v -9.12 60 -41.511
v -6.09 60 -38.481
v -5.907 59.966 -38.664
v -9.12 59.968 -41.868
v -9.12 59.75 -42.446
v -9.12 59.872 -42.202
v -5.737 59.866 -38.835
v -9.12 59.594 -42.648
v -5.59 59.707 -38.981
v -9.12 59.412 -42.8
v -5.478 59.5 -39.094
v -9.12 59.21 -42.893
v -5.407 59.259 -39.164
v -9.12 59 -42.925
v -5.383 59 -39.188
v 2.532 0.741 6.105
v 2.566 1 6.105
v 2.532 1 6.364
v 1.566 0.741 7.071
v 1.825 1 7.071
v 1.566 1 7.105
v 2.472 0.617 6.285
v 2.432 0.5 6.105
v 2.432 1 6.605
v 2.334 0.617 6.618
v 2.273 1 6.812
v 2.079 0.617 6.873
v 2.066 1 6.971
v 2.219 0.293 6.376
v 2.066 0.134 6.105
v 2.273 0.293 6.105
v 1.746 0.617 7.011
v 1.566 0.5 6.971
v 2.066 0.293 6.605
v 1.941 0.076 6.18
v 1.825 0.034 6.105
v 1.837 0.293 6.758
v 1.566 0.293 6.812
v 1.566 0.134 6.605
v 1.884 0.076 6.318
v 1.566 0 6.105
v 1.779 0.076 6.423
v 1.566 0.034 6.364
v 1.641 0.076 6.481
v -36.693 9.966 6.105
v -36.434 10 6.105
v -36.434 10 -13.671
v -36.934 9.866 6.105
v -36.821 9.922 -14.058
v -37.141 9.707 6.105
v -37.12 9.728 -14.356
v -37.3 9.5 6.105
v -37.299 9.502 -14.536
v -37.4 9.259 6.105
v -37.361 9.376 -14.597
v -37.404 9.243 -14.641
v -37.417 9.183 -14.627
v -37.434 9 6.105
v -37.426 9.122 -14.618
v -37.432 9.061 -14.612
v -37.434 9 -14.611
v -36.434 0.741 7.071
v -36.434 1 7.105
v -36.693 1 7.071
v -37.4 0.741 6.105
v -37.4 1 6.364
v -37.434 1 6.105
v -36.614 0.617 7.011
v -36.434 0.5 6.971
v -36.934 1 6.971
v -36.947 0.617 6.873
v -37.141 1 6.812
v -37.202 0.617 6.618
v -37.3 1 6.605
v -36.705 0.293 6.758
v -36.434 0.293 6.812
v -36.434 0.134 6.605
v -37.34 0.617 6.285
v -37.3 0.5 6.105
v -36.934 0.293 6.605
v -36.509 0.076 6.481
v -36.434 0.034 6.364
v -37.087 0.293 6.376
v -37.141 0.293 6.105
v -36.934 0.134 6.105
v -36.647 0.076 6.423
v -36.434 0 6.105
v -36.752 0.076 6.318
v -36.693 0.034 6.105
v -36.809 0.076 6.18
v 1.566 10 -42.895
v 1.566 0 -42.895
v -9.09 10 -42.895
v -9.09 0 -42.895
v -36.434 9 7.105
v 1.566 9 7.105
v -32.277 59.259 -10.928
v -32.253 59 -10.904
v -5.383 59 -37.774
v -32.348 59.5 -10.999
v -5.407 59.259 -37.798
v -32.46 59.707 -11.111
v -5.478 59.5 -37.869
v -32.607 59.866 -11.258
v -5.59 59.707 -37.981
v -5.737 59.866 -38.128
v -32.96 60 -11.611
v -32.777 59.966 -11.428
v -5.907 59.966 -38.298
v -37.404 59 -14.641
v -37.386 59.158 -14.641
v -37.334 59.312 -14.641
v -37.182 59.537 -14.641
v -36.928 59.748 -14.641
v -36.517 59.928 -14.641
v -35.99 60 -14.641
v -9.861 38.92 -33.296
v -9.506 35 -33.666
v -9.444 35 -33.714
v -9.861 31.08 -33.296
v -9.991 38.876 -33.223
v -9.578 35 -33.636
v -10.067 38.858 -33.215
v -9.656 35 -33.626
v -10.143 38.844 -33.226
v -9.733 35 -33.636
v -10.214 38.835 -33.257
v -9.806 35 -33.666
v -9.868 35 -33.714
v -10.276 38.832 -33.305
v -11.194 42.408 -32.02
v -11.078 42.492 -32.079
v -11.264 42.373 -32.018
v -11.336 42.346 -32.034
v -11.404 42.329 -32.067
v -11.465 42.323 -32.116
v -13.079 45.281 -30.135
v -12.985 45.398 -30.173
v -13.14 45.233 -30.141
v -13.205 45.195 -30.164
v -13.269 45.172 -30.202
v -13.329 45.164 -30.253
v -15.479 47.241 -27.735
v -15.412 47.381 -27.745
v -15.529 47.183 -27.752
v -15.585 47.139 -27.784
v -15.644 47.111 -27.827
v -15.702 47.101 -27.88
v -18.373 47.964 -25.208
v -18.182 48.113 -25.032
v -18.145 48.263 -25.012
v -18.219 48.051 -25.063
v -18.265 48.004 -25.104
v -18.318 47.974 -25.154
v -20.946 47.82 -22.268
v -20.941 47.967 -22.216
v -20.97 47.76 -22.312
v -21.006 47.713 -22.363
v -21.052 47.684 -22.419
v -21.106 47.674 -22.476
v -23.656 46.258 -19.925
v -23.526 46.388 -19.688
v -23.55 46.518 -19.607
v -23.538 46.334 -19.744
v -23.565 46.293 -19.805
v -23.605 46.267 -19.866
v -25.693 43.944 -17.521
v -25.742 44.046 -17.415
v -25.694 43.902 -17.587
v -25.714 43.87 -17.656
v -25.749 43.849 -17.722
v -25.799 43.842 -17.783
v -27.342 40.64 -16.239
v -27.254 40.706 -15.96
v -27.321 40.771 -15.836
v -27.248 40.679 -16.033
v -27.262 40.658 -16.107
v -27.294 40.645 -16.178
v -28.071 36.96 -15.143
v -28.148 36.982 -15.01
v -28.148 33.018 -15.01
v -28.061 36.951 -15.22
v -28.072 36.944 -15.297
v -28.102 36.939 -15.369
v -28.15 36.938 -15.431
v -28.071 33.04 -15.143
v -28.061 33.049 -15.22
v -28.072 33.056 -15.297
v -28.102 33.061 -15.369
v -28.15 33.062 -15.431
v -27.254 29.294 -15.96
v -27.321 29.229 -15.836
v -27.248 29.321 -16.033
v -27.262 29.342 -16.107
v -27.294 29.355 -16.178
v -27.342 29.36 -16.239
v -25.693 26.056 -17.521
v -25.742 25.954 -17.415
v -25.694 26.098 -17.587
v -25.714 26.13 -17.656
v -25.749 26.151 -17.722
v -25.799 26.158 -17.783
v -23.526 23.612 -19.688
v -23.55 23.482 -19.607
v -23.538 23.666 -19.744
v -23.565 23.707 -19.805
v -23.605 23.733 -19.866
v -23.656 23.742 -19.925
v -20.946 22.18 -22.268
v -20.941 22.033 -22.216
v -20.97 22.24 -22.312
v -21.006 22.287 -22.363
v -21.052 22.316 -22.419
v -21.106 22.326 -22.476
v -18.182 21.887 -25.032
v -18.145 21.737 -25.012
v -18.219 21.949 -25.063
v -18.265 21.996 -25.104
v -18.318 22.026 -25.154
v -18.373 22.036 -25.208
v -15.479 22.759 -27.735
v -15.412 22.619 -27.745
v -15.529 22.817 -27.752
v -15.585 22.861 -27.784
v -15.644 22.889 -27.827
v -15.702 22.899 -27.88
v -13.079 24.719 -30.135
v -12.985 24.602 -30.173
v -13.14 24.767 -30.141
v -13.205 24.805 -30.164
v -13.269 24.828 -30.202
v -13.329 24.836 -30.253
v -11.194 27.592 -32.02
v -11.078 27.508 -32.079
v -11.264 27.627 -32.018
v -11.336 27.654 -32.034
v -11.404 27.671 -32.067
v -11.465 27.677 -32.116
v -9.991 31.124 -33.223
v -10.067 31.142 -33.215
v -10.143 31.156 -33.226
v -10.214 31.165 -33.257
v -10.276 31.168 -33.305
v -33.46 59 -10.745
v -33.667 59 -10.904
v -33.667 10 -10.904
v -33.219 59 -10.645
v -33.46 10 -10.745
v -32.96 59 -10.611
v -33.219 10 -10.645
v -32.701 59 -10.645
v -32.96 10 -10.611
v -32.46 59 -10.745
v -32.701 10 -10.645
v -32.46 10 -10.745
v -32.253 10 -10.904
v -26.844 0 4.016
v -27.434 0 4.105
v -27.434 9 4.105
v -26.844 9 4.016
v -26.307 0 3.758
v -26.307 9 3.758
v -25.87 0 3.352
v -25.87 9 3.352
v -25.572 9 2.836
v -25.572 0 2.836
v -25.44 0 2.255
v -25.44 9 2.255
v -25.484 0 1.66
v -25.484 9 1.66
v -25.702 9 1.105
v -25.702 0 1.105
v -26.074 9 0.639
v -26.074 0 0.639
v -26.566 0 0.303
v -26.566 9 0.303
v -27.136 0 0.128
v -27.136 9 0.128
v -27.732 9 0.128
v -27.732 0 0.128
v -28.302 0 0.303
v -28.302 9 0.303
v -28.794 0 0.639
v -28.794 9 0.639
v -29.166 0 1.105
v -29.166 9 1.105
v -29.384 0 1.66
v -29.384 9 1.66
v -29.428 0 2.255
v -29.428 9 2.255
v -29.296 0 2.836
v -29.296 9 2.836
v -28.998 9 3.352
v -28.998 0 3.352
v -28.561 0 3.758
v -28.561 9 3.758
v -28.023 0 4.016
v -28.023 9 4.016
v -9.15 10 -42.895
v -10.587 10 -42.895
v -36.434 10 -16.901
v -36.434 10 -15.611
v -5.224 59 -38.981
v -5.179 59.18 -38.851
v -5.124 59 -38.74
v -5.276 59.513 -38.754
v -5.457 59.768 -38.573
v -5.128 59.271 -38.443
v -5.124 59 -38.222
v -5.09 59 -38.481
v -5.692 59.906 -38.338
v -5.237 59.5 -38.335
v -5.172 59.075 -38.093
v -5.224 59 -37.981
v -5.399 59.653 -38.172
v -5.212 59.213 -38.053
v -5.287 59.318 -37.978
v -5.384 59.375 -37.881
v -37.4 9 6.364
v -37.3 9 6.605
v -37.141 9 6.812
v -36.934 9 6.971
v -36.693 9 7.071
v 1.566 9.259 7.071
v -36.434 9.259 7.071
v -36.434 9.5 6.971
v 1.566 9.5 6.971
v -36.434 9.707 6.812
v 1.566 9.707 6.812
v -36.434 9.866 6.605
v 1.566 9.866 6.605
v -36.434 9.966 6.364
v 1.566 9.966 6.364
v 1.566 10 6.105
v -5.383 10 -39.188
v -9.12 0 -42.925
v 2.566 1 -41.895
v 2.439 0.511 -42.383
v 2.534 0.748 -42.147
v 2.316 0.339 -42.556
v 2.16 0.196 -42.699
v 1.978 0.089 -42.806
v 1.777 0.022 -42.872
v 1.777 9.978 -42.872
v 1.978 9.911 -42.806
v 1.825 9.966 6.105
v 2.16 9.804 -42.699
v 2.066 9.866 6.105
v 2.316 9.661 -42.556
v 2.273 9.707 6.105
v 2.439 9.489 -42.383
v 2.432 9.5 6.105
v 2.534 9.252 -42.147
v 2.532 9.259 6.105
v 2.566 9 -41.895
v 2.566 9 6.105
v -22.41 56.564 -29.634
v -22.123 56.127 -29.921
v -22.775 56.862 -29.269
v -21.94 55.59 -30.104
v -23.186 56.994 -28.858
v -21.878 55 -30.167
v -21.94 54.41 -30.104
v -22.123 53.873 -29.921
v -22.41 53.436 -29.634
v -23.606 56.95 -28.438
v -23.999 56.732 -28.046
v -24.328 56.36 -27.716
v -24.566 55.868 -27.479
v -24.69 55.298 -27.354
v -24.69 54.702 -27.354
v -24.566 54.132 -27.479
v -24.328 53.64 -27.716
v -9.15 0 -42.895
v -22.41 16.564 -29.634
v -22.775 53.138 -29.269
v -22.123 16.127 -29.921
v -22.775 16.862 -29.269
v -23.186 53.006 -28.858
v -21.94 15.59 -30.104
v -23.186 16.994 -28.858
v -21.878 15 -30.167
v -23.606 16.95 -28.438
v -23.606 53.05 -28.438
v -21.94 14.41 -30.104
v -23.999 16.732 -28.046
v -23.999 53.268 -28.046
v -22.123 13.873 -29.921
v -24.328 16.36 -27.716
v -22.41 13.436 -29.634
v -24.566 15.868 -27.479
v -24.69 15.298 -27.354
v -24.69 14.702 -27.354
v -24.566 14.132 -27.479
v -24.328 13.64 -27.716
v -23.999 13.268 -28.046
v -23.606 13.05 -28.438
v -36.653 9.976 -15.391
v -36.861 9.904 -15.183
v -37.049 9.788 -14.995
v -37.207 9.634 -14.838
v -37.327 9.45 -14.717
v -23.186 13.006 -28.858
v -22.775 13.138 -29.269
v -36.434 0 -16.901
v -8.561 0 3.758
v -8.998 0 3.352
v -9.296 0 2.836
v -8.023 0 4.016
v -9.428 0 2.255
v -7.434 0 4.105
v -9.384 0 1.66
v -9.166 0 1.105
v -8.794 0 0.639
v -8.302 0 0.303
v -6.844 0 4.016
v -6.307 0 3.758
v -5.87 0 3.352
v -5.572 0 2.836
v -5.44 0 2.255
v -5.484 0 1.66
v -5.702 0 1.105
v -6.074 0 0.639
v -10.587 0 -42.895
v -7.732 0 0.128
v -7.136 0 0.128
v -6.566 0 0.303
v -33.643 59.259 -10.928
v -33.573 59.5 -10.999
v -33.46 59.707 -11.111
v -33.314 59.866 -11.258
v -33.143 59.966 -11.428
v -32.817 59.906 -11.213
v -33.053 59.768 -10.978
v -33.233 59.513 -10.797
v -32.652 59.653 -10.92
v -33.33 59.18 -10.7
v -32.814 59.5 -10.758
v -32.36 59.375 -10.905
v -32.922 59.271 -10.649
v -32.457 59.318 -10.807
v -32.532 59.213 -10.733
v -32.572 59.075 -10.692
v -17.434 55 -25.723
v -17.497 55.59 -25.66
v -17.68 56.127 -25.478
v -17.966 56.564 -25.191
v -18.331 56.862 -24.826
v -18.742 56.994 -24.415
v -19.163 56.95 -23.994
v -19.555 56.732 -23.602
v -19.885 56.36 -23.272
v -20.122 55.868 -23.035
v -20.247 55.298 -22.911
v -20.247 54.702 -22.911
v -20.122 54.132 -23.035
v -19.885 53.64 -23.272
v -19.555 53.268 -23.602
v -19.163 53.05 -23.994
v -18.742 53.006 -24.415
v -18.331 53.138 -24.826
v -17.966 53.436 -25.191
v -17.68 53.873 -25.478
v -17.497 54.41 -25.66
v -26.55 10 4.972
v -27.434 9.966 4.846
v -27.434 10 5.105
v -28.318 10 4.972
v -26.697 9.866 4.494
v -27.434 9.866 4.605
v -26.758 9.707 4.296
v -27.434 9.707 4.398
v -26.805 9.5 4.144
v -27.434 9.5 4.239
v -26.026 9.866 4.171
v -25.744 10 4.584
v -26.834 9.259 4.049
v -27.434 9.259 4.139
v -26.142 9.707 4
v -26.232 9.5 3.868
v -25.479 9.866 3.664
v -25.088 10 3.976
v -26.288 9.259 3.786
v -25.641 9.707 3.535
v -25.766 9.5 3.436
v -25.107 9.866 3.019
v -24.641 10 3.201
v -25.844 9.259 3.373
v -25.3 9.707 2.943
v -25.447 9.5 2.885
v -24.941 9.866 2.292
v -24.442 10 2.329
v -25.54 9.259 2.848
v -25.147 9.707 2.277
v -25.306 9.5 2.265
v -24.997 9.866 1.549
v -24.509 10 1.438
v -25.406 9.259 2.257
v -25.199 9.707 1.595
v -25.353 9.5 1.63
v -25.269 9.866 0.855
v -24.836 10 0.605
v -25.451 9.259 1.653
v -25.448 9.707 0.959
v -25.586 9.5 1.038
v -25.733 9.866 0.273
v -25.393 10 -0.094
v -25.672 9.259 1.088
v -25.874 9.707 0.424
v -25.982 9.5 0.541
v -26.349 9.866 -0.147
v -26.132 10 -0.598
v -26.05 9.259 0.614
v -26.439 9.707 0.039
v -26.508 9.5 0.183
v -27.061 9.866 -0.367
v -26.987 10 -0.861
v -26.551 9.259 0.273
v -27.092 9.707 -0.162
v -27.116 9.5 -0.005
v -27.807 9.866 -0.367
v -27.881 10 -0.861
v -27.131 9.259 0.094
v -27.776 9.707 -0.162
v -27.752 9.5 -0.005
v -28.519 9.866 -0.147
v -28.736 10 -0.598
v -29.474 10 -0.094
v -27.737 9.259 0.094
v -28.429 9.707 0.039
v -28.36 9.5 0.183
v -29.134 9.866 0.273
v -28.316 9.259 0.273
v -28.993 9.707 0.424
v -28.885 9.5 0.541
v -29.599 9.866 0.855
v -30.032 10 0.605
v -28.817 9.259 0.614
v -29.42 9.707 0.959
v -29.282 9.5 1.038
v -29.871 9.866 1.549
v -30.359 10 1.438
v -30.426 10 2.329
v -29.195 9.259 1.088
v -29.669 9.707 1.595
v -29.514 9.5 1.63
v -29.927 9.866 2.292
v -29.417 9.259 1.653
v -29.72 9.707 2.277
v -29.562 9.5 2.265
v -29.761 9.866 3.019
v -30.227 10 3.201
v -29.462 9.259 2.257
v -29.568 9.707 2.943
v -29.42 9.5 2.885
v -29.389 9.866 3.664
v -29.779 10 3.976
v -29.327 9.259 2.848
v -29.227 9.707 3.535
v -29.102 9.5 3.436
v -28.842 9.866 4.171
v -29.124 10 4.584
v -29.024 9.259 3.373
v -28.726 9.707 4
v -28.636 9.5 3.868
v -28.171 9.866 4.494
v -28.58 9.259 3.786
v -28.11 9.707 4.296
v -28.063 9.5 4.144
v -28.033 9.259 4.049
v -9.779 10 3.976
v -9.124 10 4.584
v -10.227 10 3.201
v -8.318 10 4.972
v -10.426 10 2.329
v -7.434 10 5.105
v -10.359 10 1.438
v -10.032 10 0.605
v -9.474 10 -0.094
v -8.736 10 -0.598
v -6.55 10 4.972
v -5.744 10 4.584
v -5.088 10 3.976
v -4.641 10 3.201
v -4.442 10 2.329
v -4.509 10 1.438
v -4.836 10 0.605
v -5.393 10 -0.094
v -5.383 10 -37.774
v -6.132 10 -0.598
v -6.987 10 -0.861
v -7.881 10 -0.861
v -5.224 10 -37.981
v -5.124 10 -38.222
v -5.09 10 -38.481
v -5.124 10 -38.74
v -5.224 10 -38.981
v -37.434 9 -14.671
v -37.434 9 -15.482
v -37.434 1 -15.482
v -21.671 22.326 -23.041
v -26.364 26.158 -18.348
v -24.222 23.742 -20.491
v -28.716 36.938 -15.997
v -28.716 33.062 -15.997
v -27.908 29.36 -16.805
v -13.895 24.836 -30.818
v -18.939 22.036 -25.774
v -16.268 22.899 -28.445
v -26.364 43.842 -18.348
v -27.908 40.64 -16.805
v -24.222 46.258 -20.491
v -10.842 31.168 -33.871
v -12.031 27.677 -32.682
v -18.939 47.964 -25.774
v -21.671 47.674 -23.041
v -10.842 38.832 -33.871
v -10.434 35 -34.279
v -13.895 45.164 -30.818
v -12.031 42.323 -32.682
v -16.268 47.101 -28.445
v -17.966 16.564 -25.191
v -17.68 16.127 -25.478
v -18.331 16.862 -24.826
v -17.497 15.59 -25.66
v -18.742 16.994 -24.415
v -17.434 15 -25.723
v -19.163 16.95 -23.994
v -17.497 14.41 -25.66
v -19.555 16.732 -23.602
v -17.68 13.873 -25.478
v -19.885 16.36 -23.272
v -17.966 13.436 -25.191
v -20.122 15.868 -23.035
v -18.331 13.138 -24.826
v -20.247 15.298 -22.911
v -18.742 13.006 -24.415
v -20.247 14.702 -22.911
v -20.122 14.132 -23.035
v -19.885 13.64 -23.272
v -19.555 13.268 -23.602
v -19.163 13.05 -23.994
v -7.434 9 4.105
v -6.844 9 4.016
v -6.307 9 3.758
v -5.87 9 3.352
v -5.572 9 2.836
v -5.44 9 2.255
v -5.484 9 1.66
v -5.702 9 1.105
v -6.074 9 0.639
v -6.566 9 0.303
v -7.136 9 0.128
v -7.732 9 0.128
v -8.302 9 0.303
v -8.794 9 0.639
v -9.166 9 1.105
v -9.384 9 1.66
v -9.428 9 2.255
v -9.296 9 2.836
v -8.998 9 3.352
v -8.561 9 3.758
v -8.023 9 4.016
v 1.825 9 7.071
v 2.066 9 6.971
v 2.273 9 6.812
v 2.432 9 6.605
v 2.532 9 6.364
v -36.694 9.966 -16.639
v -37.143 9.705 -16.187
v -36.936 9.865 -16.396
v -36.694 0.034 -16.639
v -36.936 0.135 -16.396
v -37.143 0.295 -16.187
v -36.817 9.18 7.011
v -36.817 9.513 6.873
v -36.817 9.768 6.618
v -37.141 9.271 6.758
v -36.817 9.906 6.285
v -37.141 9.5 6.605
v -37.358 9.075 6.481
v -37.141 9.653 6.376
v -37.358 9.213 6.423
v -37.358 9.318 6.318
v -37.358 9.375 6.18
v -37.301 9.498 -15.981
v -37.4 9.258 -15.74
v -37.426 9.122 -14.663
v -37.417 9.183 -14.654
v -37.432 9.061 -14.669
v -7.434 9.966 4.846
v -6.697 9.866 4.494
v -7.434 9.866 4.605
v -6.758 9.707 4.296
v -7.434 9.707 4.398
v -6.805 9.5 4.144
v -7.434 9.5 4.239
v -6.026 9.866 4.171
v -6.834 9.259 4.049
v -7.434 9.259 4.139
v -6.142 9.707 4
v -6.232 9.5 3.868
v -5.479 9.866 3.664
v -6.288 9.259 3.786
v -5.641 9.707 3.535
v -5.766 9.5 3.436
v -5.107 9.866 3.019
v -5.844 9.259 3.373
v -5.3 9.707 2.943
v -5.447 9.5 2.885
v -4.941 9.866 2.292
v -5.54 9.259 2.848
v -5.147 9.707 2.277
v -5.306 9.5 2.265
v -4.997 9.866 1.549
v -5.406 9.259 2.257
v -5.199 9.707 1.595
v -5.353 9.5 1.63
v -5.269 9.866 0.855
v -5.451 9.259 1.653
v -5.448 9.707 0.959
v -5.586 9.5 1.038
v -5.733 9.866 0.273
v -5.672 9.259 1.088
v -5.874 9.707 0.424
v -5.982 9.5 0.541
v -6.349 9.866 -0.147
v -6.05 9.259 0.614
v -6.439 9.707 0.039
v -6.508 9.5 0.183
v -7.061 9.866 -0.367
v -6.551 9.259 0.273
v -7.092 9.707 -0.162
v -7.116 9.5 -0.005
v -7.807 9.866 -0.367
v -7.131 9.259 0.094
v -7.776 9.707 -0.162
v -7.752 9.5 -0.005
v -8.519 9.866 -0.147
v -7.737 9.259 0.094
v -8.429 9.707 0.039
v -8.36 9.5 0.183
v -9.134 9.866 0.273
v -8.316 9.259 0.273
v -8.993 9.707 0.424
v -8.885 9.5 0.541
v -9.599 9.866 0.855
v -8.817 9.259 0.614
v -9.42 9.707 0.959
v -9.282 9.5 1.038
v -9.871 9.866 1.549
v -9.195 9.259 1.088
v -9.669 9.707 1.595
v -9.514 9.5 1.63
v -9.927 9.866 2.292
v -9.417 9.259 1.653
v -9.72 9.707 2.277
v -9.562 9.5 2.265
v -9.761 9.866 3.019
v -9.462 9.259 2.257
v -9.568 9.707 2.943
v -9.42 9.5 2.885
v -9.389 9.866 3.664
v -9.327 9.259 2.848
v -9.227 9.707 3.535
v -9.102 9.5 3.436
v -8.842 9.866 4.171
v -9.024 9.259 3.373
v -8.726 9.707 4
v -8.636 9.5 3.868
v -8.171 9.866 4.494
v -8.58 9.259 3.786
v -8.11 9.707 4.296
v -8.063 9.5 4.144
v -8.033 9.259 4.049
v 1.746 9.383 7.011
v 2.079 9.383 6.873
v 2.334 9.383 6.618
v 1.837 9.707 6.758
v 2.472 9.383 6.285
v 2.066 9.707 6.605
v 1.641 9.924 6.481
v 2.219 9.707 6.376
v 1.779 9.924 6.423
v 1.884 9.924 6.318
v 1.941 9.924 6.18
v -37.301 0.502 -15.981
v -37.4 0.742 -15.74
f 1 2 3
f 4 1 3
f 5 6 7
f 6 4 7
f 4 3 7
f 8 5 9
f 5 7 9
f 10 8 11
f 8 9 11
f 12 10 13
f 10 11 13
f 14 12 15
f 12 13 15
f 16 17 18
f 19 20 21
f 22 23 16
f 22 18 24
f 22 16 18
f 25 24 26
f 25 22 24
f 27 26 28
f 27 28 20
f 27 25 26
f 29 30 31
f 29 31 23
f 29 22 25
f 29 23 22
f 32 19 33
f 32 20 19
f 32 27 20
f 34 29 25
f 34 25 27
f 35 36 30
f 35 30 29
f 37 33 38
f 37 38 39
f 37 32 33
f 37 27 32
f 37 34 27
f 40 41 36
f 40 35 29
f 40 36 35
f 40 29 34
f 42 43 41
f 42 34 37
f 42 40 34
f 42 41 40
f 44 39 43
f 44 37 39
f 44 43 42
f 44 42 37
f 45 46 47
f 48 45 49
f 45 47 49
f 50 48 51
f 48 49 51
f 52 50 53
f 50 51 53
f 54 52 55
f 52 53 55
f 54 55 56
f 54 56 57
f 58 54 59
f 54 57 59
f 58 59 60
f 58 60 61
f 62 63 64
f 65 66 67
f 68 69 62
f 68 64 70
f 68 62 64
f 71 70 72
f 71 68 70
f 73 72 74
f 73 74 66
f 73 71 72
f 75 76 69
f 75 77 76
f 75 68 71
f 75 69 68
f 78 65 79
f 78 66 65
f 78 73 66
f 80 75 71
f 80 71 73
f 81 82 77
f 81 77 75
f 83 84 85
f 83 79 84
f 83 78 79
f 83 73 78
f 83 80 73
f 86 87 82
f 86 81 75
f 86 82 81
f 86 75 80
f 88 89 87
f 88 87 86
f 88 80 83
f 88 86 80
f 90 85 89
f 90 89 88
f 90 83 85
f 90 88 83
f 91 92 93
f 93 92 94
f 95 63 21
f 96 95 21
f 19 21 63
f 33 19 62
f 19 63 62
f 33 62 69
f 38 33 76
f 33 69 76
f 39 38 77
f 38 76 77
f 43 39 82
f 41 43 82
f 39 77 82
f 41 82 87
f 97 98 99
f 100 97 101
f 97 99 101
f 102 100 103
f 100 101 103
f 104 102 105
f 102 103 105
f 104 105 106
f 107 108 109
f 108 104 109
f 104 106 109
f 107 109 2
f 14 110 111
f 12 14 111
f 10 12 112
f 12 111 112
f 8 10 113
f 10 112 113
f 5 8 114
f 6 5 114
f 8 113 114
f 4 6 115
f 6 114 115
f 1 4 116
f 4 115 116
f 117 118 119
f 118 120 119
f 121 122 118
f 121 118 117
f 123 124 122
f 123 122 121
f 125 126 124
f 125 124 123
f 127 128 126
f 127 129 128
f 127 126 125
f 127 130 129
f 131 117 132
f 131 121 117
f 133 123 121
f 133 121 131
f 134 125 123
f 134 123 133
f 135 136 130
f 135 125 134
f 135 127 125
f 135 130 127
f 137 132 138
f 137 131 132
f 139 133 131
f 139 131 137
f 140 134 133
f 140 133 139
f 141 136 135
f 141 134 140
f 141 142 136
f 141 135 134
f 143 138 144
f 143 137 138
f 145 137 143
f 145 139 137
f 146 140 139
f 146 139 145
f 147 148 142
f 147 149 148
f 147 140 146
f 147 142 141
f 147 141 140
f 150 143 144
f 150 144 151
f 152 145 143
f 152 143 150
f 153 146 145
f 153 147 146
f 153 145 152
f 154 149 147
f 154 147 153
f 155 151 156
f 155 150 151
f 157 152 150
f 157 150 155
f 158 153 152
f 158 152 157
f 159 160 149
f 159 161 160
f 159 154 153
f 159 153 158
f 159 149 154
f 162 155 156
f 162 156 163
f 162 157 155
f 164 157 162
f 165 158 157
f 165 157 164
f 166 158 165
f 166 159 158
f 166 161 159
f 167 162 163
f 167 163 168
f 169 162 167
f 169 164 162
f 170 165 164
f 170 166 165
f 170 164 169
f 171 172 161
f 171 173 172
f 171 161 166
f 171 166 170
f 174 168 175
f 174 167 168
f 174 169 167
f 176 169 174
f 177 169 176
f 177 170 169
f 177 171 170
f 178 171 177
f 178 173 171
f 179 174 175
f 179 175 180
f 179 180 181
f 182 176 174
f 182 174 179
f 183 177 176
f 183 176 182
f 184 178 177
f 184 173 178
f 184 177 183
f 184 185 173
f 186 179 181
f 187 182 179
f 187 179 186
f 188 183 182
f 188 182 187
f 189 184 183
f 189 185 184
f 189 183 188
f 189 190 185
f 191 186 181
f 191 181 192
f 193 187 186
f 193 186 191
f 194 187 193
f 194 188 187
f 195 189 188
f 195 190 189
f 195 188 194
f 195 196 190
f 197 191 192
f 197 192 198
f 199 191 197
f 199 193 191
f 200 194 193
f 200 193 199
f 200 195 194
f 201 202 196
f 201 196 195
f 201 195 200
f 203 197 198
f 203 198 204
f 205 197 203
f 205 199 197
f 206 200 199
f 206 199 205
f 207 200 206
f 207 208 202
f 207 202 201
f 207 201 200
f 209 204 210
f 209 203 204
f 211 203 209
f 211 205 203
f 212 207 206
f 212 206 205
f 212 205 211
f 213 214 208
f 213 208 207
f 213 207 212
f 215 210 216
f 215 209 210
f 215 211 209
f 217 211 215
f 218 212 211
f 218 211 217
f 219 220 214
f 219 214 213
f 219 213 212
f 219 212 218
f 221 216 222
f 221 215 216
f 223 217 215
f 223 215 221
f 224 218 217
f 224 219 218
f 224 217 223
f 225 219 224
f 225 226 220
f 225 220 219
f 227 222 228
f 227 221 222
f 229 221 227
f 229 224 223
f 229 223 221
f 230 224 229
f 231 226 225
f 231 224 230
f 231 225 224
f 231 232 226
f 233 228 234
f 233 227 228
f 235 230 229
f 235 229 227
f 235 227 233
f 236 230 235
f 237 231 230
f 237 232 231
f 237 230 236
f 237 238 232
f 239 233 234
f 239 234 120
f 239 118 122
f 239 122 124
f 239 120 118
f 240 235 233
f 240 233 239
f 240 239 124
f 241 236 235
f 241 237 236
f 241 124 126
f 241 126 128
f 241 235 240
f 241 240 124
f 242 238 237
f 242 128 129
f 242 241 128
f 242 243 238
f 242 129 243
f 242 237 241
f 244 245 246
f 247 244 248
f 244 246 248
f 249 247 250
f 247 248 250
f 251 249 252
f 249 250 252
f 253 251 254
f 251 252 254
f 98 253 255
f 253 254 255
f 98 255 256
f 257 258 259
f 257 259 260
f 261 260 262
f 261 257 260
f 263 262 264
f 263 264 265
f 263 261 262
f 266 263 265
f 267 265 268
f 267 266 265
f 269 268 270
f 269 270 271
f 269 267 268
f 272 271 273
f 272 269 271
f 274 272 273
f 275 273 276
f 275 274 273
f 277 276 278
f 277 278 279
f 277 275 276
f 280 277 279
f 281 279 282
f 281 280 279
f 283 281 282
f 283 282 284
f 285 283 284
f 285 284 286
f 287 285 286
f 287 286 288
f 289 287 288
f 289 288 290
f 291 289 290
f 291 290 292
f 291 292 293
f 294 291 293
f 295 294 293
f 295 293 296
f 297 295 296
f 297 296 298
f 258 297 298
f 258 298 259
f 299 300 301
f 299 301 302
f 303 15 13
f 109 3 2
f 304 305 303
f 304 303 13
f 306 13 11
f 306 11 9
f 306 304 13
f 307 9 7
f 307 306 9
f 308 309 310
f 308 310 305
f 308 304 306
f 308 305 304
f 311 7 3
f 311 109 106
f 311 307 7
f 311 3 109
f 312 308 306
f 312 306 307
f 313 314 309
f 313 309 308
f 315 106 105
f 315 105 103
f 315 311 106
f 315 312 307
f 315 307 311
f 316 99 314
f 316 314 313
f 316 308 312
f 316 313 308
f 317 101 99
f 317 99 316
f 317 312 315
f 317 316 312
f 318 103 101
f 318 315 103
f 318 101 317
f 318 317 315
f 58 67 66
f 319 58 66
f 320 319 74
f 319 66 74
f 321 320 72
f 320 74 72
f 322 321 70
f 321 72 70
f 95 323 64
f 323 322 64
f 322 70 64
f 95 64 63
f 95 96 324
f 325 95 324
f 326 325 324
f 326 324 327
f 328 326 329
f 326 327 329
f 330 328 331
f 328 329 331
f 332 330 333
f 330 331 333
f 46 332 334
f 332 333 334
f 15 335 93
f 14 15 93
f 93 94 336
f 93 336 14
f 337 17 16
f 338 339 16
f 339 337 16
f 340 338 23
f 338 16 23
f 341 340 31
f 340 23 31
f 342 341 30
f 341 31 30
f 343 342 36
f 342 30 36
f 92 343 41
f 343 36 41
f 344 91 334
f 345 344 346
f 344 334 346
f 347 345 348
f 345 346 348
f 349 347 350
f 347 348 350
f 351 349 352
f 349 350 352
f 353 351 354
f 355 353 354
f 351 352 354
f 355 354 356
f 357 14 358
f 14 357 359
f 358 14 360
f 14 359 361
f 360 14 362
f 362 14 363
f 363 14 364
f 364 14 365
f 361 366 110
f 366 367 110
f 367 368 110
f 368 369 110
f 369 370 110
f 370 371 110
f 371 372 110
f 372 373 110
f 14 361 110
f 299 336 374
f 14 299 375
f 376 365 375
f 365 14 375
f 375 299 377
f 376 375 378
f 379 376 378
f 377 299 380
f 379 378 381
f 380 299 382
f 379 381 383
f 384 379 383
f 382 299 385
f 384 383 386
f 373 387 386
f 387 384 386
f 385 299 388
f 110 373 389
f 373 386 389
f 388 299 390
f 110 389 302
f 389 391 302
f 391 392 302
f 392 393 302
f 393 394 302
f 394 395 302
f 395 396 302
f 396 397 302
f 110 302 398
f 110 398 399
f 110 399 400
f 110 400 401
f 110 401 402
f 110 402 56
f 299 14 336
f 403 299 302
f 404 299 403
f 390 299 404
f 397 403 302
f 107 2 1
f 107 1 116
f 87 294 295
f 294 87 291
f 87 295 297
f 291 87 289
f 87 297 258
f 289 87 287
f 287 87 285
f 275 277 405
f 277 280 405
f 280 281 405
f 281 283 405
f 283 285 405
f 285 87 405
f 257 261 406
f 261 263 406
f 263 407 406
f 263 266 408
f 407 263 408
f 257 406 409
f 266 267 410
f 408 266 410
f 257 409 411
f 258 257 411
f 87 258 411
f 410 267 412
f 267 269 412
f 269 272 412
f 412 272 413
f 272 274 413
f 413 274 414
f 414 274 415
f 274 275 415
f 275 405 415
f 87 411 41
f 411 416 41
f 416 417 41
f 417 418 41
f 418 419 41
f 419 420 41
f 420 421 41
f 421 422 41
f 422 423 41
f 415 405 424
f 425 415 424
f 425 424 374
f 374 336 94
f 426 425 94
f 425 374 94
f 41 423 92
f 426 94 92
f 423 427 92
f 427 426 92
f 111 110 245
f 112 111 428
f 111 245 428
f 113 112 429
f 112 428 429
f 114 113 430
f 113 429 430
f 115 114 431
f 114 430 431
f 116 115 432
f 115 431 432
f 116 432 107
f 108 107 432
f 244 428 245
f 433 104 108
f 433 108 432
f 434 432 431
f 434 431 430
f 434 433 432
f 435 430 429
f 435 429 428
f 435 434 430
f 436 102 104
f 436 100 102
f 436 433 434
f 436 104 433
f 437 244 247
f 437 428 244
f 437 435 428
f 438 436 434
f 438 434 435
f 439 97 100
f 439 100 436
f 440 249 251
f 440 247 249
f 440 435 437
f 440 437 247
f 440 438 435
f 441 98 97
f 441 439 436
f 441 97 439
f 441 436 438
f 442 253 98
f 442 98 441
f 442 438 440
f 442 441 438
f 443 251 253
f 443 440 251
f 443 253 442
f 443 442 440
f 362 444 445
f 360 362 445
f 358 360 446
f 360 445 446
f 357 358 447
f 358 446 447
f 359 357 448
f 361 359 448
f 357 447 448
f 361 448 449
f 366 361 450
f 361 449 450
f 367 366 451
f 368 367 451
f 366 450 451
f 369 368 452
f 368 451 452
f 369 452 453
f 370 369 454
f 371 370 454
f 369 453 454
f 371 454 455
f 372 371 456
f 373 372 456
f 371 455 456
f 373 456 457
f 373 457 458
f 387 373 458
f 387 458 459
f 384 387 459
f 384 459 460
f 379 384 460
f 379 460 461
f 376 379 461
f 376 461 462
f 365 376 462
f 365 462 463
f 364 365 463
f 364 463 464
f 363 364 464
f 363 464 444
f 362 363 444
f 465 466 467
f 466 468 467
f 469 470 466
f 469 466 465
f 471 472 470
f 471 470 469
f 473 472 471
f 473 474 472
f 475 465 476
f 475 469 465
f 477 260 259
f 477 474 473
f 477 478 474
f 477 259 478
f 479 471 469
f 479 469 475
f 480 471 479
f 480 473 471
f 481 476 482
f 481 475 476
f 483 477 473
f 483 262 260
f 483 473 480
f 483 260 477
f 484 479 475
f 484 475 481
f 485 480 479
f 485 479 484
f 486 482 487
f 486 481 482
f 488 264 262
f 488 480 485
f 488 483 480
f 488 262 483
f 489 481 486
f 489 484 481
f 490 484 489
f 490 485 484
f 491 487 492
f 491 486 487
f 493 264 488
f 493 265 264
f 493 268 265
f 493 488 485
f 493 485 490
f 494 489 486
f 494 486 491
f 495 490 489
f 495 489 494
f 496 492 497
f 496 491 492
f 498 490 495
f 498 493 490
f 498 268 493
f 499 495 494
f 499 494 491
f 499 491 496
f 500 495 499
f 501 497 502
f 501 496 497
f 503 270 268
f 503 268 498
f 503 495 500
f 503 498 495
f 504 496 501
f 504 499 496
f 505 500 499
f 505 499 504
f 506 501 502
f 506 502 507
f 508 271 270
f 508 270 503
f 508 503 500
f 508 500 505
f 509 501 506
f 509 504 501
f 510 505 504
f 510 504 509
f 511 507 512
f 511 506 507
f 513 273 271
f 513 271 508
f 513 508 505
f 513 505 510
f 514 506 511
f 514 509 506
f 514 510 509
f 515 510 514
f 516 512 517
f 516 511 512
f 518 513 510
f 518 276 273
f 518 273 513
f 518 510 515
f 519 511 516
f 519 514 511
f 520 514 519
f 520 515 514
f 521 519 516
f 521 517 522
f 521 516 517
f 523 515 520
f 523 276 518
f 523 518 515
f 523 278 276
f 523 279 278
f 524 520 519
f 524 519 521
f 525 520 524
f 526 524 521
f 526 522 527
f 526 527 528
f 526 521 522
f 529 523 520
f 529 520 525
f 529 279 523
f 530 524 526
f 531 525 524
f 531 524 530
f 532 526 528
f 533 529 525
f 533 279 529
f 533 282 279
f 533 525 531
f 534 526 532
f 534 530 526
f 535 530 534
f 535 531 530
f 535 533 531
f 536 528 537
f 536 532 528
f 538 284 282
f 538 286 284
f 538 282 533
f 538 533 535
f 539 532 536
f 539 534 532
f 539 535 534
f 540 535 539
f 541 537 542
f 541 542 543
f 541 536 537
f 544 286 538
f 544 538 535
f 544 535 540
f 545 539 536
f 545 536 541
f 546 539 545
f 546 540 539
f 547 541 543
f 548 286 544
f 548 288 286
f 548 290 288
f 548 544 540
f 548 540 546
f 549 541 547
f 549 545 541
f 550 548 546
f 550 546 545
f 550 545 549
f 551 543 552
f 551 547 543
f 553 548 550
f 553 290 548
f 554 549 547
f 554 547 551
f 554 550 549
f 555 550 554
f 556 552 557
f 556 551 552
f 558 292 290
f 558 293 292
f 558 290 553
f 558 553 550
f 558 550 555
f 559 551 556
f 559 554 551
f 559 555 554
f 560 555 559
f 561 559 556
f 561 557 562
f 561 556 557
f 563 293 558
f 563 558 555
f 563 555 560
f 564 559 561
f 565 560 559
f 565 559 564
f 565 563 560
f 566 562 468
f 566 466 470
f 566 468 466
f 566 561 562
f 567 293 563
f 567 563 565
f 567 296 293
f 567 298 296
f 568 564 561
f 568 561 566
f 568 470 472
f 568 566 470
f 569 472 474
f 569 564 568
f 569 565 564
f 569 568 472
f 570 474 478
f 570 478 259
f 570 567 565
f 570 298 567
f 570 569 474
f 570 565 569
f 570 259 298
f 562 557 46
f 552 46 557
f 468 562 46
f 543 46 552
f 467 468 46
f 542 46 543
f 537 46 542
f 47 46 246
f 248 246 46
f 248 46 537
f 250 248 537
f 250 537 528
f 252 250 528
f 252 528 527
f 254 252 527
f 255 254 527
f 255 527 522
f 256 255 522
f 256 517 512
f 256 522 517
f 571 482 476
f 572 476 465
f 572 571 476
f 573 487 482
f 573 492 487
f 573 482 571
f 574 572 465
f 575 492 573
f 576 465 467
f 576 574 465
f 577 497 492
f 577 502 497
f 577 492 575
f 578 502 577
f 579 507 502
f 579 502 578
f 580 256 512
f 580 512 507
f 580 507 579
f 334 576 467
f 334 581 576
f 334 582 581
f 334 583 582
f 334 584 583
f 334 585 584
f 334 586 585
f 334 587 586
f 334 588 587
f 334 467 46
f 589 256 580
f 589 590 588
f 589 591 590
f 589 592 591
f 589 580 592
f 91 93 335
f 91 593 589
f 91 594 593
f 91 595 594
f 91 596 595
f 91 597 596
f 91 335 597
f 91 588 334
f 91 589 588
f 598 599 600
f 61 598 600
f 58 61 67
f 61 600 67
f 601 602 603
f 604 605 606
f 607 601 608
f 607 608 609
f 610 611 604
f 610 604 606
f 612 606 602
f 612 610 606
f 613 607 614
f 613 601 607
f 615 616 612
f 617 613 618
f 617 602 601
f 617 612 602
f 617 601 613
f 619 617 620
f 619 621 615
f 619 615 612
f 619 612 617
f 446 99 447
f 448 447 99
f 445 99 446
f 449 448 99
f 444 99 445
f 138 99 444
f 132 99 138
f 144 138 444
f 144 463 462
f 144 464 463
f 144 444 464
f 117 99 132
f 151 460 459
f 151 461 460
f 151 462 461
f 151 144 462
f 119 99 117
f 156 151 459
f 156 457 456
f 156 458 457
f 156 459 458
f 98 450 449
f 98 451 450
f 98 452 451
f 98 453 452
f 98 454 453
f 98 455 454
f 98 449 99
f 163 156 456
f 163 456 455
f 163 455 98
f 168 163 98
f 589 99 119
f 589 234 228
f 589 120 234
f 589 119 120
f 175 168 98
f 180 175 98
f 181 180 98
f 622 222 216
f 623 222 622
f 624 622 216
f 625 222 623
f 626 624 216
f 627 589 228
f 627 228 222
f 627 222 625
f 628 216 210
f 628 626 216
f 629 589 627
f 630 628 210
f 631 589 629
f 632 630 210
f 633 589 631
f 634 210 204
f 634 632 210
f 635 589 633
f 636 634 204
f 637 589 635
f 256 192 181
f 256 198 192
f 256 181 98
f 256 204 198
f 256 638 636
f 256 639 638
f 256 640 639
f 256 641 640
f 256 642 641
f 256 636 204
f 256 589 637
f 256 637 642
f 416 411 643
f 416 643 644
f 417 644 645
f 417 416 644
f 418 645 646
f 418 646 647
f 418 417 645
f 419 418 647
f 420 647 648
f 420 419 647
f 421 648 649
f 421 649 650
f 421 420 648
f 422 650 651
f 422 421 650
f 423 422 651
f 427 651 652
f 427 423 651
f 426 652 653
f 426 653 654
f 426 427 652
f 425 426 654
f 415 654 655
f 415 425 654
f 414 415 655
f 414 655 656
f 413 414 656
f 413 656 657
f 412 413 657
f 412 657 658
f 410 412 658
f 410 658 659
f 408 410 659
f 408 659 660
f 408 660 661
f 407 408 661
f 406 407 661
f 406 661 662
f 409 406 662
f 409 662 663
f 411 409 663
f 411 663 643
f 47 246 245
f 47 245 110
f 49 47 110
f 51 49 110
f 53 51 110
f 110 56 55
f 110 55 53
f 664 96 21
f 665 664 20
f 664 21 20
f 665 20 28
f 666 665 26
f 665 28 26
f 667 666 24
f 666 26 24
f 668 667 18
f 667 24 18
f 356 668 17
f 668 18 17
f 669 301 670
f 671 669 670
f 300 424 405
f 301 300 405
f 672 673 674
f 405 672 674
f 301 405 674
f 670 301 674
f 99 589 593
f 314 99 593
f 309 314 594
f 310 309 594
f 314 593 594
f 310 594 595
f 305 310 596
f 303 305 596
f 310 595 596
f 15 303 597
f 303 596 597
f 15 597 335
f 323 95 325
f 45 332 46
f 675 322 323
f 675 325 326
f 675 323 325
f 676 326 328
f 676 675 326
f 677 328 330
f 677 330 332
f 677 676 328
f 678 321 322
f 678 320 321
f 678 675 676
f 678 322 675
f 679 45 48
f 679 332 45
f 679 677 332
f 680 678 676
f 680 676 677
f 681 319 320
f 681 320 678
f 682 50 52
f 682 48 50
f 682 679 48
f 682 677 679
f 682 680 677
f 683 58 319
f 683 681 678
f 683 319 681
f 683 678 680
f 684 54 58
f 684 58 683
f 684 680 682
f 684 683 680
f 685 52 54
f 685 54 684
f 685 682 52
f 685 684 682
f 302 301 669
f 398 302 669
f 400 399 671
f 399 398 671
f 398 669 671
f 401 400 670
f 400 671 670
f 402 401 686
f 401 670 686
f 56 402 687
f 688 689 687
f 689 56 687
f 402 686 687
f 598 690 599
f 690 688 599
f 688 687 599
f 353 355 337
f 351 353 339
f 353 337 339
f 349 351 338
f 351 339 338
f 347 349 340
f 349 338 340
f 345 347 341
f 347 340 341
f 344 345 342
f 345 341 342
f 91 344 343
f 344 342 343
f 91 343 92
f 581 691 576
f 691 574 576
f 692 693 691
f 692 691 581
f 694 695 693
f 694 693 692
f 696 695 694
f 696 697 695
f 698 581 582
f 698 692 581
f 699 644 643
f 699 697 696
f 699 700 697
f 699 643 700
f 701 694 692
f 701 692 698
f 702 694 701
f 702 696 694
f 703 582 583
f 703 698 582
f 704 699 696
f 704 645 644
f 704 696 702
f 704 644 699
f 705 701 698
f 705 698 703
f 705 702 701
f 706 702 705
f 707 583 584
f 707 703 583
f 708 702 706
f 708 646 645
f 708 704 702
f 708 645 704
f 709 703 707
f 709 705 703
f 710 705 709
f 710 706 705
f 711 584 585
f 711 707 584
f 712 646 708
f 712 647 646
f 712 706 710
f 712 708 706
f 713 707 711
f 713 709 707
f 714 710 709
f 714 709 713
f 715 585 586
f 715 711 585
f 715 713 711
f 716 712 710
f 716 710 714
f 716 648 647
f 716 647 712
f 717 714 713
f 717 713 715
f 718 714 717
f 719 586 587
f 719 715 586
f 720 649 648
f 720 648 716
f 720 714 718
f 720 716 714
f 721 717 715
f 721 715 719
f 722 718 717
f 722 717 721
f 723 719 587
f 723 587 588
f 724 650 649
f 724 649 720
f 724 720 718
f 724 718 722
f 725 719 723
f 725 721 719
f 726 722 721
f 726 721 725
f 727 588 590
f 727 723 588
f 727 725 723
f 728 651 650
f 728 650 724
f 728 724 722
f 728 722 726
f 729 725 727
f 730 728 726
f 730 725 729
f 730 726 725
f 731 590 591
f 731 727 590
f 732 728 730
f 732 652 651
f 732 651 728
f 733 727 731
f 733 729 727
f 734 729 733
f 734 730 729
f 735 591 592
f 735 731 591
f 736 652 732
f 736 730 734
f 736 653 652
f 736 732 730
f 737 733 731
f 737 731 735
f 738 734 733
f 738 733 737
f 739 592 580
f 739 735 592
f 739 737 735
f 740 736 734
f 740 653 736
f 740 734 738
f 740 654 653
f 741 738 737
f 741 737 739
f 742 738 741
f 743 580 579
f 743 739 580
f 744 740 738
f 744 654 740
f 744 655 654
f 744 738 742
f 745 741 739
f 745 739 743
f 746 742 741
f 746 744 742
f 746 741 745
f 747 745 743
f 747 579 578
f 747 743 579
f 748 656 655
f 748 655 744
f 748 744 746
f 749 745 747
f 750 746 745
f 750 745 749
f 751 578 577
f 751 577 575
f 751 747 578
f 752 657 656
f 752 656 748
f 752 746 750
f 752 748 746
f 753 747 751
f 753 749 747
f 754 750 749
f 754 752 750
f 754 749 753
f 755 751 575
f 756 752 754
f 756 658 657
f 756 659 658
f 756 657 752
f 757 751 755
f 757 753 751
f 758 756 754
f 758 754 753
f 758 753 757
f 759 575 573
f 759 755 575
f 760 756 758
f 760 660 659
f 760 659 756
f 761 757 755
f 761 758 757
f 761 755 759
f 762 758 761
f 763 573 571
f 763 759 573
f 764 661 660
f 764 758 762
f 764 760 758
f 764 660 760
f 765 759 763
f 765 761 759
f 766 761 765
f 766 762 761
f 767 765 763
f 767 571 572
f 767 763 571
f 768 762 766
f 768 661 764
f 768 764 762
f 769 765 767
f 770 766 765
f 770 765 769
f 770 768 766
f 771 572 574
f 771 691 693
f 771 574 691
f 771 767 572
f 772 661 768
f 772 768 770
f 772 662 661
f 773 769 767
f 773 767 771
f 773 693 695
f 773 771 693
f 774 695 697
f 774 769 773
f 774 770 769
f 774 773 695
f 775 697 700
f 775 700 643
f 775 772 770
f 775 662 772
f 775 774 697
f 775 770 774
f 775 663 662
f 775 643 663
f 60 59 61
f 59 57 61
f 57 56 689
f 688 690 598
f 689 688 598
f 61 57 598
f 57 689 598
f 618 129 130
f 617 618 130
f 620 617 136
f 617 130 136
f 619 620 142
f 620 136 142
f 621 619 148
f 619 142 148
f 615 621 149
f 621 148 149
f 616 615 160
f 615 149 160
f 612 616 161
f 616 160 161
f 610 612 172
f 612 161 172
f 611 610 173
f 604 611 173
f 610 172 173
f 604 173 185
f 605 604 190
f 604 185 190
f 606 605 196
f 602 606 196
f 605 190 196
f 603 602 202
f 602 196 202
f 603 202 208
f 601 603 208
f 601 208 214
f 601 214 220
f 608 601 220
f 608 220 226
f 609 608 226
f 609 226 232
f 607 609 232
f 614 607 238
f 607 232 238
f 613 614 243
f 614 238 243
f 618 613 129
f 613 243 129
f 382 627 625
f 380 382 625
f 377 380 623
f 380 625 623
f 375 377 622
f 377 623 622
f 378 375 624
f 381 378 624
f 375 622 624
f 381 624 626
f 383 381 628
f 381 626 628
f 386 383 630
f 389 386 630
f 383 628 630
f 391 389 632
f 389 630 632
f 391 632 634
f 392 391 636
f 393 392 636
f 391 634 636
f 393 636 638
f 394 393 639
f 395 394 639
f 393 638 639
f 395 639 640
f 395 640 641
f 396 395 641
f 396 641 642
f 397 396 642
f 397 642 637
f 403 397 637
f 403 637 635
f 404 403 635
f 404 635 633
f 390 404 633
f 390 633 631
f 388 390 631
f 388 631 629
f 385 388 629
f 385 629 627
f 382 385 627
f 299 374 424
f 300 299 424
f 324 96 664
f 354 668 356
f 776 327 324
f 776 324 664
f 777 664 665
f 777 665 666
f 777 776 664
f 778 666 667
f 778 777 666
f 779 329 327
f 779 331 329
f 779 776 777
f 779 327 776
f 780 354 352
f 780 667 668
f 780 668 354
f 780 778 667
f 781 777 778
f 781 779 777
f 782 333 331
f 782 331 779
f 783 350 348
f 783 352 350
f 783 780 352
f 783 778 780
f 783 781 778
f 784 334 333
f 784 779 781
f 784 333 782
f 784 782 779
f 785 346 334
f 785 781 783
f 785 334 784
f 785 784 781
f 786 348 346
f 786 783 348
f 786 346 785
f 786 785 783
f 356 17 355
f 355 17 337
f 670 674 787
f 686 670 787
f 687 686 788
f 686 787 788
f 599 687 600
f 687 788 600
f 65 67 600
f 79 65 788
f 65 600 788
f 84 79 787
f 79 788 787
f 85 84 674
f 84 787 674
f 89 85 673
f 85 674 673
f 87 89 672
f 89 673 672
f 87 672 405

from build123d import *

# Parameters (mm, degrees)
SKETCH_1_R          = 2
EXTRUDE_1_DEPTH     = 10
EXTRUDE_2_DEPTH     = 60
SKETCH_2_R          = 13
CUT_EXTRUDE_1_DEPTH = 1.1
FILLET_1_R          = 0.3
FILLET_2_R          = 1
SKETCH_2_3_R        = 2
CUT_EXTRUDE_2_DEPTH = 71.751134663


with BuildPart() as part:
    # 草图1 → 凸台-拉伸1 (new body)
    with BuildSketch(Plane(origin=(0, 0, 0), x_dir=(1, 0, 0), z_dir=(0, 1, 0))):
        Polygon((2.566075632, 42.89482758), (-10.586870806, 42.89482758), (-37.433924368, 15.89482758), (-37.433924368, -7.10517242), (-17.433924368, -7.10517242), (2.566075632, -7.10517242), align=None)
        with Locations(Location((-27.433924368, -2.10517242, 0), (0, 0, 270))):
            Circle(SKETCH_1_R, mode=Mode.SUBTRACT)
        with Locations(Location((-7.433924368, -2.10517242, 0), (0, 0, 270))):
            Circle(SKETCH_1_R, mode=Mode.SUBTRACT)
    extrude(amount=EXTRUDE_1_DEPTH)

    # 草图1<3> → 凸台-拉伸2 (add)
    with BuildSketch(Plane(origin=(0, 0, 0), x_dir=(1, 0, 0), z_dir=(0, 1, 0))):
        Polygon((-32.960298008, 10.196881065), (-37.403948822, 14.640531879), (-23.261813198, 28.782667503), (-9.119677574, 42.924803127), (-4.67602676, 38.481152313), align=None)
        Polygon((-9.149653121, 42.89482758), (-23.261813198, 28.782667503), (-37.403948822, 14.640531879), (-32.960298008, 10.196881065), (-4.67602676, 38.481152313), (-9.089702028, 42.89482758), align=None)
    extrude(amount=EXTRUDE_2_DEPTH)

    # 草图2 → 切除-拉伸1 (cut)
    with BuildSketch(Plane(origin=(-21.578589537, 0, -21.578589537), x_dir=(0.7071067811865472, 0, -0.7071067811865478), z_dir=(0.7071067811865478, 0, 0.7071067811865472))):
        with Locations((3.861441693, 35)):
            Circle(SKETCH_2_R)
    extrude(amount=-CUT_EXTRUDE_1_DEPTH, mode=Mode.SUBTRACT)

    # 圆角1
    fillet_1_edges = [part.edges().sort_by_distance(p)[0] for p in [
        (-28.040526086, 35, -15.116652987),
    ]]
    fillet(fillet_1_edges, radius=FILLET_1_R)

    # 圆角2
    # the kernel refuses this fillet: 1 mm, written as the material it takes off along each edge
    with BuildSketch(Plane(origin=(-36.433924368, 1, 6.10517242), x_dir=(-1, 0, 0), z_dir=(0, -1, 0))) as fillet_2_piece_1_section:
        Polygon((0, 0), (FILLET_2_R, 0), (FILLET_2_R, -FILLET_2_R), (0, -FILLET_2_R), align=None)
    fillet_2_piece_1 = extrude(amount=FILLET_2_R, mode=Mode.PRIVATE)
    fillet_2_piece_1 = fillet_2_piece_1 - Plane(origin=(-36.433924368, 1, 6.10517242), x_dir=(0.7071067811865475, 0, -0.7071067811865475), z_dir=(0, -1, 0)) * Sphere(FILLET_2_R, mode=Mode.PRIVATE)
    add(fillet_2_piece_1, mode=Mode.SUBTRACT)
    with BuildSketch(Plane(origin=(1.566075632, 1, 6.10517242), x_dir=(1, 0, 0), z_dir=(0, -1, 0))) as fillet_2_piece_2_section:
        Polygon((0, 0), (FILLET_2_R, 0), (FILLET_2_R, FILLET_2_R), (0, FILLET_2_R), align=None)
    fillet_2_piece_2 = extrude(amount=FILLET_2_R, mode=Mode.PRIVATE)
    fillet_2_piece_2 = fillet_2_piece_2 - Plane(origin=(1.566075632, 1, 6.10517242), x_dir=(-0.7071067811865475, 0, -0.7071067811865475), z_dir=(0, -1, 0)) * Sphere(FILLET_2_R, mode=Mode.PRIVATE)
    add(fillet_2_piece_2, mode=Mode.SUBTRACT)
    with BuildSketch(Plane(origin=(-36.433924368, 9, 6.10517242), x_dir=(0, 1, 0), z_dir=(-1, 0, 0))) as fillet_2_piece_3_section:
        Polygon((0, 0), (FILLET_2_R, 0), (FILLET_2_R, -FILLET_2_R), (0, -FILLET_2_R), align=None)
    fillet_2_piece_3 = extrude(amount=FILLET_2_R, mode=Mode.PRIVATE)
    fillet_2_piece_3 = fillet_2_piece_3 - Plane(origin=(-36.433924368, 9, 6.10517242), x_dir=(0, -0.7071067811865475, -0.7071067811865475), z_dir=(-1, 0, 0)) * Sphere(FILLET_2_R, mode=Mode.PRIVATE)
    add(fillet_2_piece_3, mode=Mode.SUBTRACT)
    with BuildSketch(Plane(origin=(1.566075632, 9, 6.10517242), x_dir=(1, 0, 0), z_dir=(0, 1, 0))) as fillet_2_piece_4_section:
        Polygon((0, 0), (FILLET_2_R, 0), (FILLET_2_R, -FILLET_2_R), (0, -FILLET_2_R), align=None)
    fillet_2_piece_4 = extrude(amount=FILLET_2_R, mode=Mode.PRIVATE)
    fillet_2_piece_4 = fillet_2_piece_4 - Plane(origin=(1.566075632, 9, 6.10517242), x_dir=(-0.7071067811865475, 0, -0.7071067811865475), z_dir=(0, 1, 0)) * Sphere(FILLET_2_R, mode=Mode.PRIVATE)
    add(fillet_2_piece_4, mode=Mode.SUBTRACT)
    with BuildSketch(Plane(origin=(-6.090240323, 59, -38.481152313), x_dir=(0.7071067811865481, 0, -0.707106781186547), z_dir=(0.7071067811865475, 0, 0.7071067811865476))) as fillet_2_piece_5_section:
        Polygon((0, 0), (FILLET_2_R, 0), (FILLET_2_R, FILLET_2_R), (0, FILLET_2_R), align=None)
    fillet_2_piece_5 = extrude(amount=FILLET_2_R, mode=Mode.PRIVATE)
    fillet_2_piece_5 = fillet_2_piece_5 - Plane(origin=(-6.090240323, 59, -38.481152313), x_dir=(-0.5000000000000004, -0.7071067811865475, 0.4999999999999996), z_dir=(0.7071067811865475, 0, 0.7071067811865476)) * Sphere(FILLET_2_R, mode=Mode.PRIVATE)
    add(fillet_2_piece_5, mode=Mode.SUBTRACT)
    with BuildSketch(Plane(origin=(-32.960298008, 59, -11.611094628), x_dir=(-0.707106781186548, 0, 0.7071067811865471), z_dir=(0.7071067811865475, 0, 0.7071067811865476))) as fillet_2_piece_6_section:
        Polygon((0, 0), (FILLET_2_R, 0), (FILLET_2_R, -FILLET_2_R), (0, -FILLET_2_R), align=None)
    fillet_2_piece_6 = extrude(amount=FILLET_2_R, mode=Mode.PRIVATE)
    fillet_2_piece_6 = fillet_2_piece_6 - Plane(origin=(-32.960298008, 59, -11.611094628), x_dir=(0.5000000000000003, -0.7071067811865475, -0.49999999999999967), z_dir=(0.7071067811865475, 0, 0.7071067811865476)) * Sphere(FILLET_2_R, mode=Mode.PRIVATE)
    add(fillet_2_piece_6, mode=Mode.SUBTRACT)
    with BuildSketch(Plane(origin=(-7.433924368, 10, 2.10517242), x_dir=(0, 0, 1), z_dir=(-1, 0, 0))) as fillet_2_piece_7:
        with BuildLine():
            CenterArc((2 + FILLET_2_R, -FILLET_2_R), FILLET_2_R, 90, 90)
            Line((2, -FILLET_2_R), (2, 0))
            Line((2, 0), (2 + FILLET_2_R, 0))
        make_face()
    revolve(axis=Axis((-7.433924368, 10, 2.10517242), (0, 1, 0)), mode=Mode.SUBTRACT)
    with BuildSketch(Plane(origin=(-36.433924368, 0, 7.10517242), x_dir=(0, 1, 0), z_dir=(1, 0, 0)), Plane(origin=(-5.383133542, 60, -37.774045532), x_dir=(0, -1, 0), z_dir=(-0.7071067811865476, 0, 0.7071067811865475))) as fillet_2_piece_8:
        with BuildLine():
            CenterArc((FILLET_2_R, -FILLET_2_R), FILLET_2_R, 90, 90)
            Line((0, -FILLET_2_R), (0, 0))
            Line((0, 0), (FILLET_2_R, 0))
        make_face()
    extrude(amount=38, mode=Mode.SUBTRACT)
    with BuildSketch(Plane(origin=(-37.433924368, 0, -18.39482758), x_dir=(0, 1, 0), z_dir=(0, 0, 1))) as fillet_2_piece_9:
        with BuildLine():
            CenterArc((FILLET_2_R, -FILLET_2_R), FILLET_2_R, 90, 90)
            Line((0, -FILLET_2_R), (0, 0))
            Line((0, 0), (FILLET_2_R, 0))
        make_face()
    extrude(amount=24.5, mode=Mode.SUBTRACT)
    with BuildSketch(Plane(origin=(-37.433924368, 10, -18.39482758), x_dir=(1, 0, 0), z_dir=(0, 0, 1))) as fillet_2_piece_10_section:
        with BuildLine():
            CenterArc((FILLET_2_R, -FILLET_2_R), FILLET_2_R, 90, 90)
            Line((0, -FILLET_2_R), (0, 0))
            Line((0, 0), (FILLET_2_R, 0))
        make_face()
    fillet_2_piece_10 = extrude(amount=24.5, mode=Mode.PRIVATE)
    fillet_2_piece_10 = split(fillet_2_piece_10, bisect_by=Plane(origin=(-36.324921122, 9.766519009, -15.719559578), z_dir=(-0.7071067811865477, 0, -0.7071067811865474)), keep=Keep.TOP, mode=Mode.PRIVATE)
    fillet_2_piece_10 = split(fillet_2_piece_10, bisect_by=Plane(origin=(-38.299035866, 9.766519009, -15.535618924), z_dir=(0.707106781186548, 0, -0.7071067811865471)), keep=Keep.TOP, mode=Mode.PRIVATE)
    add(fillet_2_piece_10, mode=Mode.SUBTRACT)
    with BuildSketch(Plane(origin=(-37.433924368, 10, -18.39482758), x_dir=(1, 0, 0), z_dir=(0, 0, 1))) as fillet_2_piece_11_section:
        with BuildLine():
            CenterArc((FILLET_2_R, -FILLET_2_R), FILLET_2_R, 90, 90)
            Line((0, -FILLET_2_R), (0, 0))
            Line((0, 0), (FILLET_2_R, 0))
        make_face()
    fillet_2_piece_11 = extrude(amount=24.5, mode=Mode.PRIVATE)
    fillet_2_piece_11 = split(fillet_2_piece_11, bisect_by=Plane(origin=(-37.42099653, 9.530875179, -14.623484171), z_dir=(-0.7071067811865477, 0, -0.7071067811865474)), keep=Keep.TOP, mode=Mode.PRIVATE)
    fillet_2_piece_11 = split(fillet_2_piece_11, bisect_by=Plane(origin=(-37.42099653, 9.530875179, -14.657579587), z_dir=(-0.707106781186548, 0, 0.7071067811865471)), keep=Keep.TOP, mode=Mode.PRIVATE)
    add(fillet_2_piece_11, mode=Mode.SUBTRACT)
    with BuildSketch(Plane(origin=(-37.433924368, 10, -18.39482758), x_dir=(1, 0, 0), z_dir=(0, 0, 1))) as fillet_2_piece_12_section:
        with BuildLine():
            CenterArc((FILLET_2_R, -FILLET_2_R), FILLET_2_R, 90, 90)
            Line((0, -FILLET_2_R), (0, 0))
            Line((0, 0), (FILLET_2_R, 0))
        make_face()
    fillet_2_piece_12 = extrude(amount=24.5, mode=Mode.PRIVATE)
    fillet_2_piece_12 = split(fillet_2_piece_12, bisect_by=Plane(origin=(-42.544211764, 9.772380765, -9.500268936), z_dir=(0.7071067811865477, 0, 0.7071067811865474)), keep=Keep.TOP, mode=Mode.PRIVATE)
    fillet_2_piece_12 = split(fillet_2_piece_12, bisect_by=Plane(origin=(-32.069422105, 9.772380765, -9.306005163), z_dir=(-0.707106781186548, 0, 0.7071067811865471)), keep=Keep.TOP, mode=Mode.PRIVATE)
    add(fillet_2_piece_12, mode=Mode.SUBTRACT)
    with BuildSketch(Plane(origin=(-37.433924368, -1.03137671, -15.89482758), x_dir=(0, 0, 1), z_dir=(0, 1, 0))) as fillet_2_piece_13:
        with BuildLine():
            CenterArc((FILLET_2_R * 0.412550684114, FILLET_2_R), FILLET_2_R, 225.162741715, 44.837258285)
            Line((-FILLET_2_R * 0.29254479632, FILLET_2_R * 0.290887622818), (0, 0))
            Line((0, 0), (FILLET_2_R * 0.412550684114, 0))
        make_face()
    extrude(amount=12.062753421, mode=Mode.SUBTRACT)
    with BuildSketch(Plane(origin=(2.566075632, -2.5, -42.89482758), x_dir=(-1, 0, 0), z_dir=(0, 1, 0))) as fillet_2_piece_14:
        with BuildLine():
            CenterArc((FILLET_2_R, FILLET_2_R), FILLET_2_R, 180, 90)
            Line((0, FILLET_2_R), (0, 0))
            Line((0, 0), (FILLET_2_R, 0))
        make_face()
    extrude(amount=15, mode=Mode.SUBTRACT)
    with BuildSketch(Plane(origin=(2.566075632, 1, 7.10517242), x_dir=(-1, 0, 0), z_dir=(0, 1, 0))) as fillet_2_piece_15:
        with BuildLine():
            CenterArc((FILLET_2_R, -FILLET_2_R), FILLET_2_R, 90, 90)
            Line((0, -FILLET_2_R), (0, 0))
            Line((0, 0), (FILLET_2_R, 0))
        make_face()
    extrude(amount=8, mode=Mode.SUBTRACT)
    with BuildSketch(Plane(origin=(-37.433924368, 1, 7.10517242), x_dir=(1, 0, 0), z_dir=(0, 1, 0))) as fillet_2_piece_16:
        with BuildLine():
            CenterArc((FILLET_2_R, FILLET_2_R), FILLET_2_R, 180, 90)
            Line((0, FILLET_2_R), (0, 0))
            Line((0, 0), (FILLET_2_R, 0))
        make_face()
    extrude(amount=8, mode=Mode.SUBTRACT)
    with BuildSketch(Plane(origin=(1.566075632, 10, 7.10517242), x_dir=(0, 0, -1), z_dir=(-1, 0, 0))) as fillet_2_piece_17:
        with BuildLine():
            CenterArc((FILLET_2_R, FILLET_2_R), FILLET_2_R, 180, 90)
            Line((0, FILLET_2_R), (0, 0))
            Line((0, 0), (FILLET_2_R, 0))
        make_face()
    extrude(amount=38, mode=Mode.SUBTRACT)
    with BuildSketch(Plane(origin=(2.566075632, 10, 6.10517242), x_dir=(-1, 0, 0), z_dir=(0, 0, -1)), Plane(origin=(2.566075632, 0, 6.10517242), x_dir=(0, 1, 0), z_dir=(0, 0, -1))) as fillet_2_piece_18:
        with BuildLine():
            CenterArc((FILLET_2_R, -FILLET_2_R), FILLET_2_R, 90, 90)
            Line((0, -FILLET_2_R), (0, 0))
            Line((0, 0), (FILLET_2_R, 0))
        make_face()
    extrude(amount=51.5, mode=Mode.SUBTRACT)
    with BuildSketch(Plane(origin=(-5.383133542, 60, -39.188259094), x_dir=(0, -1, 0), z_dir=(-0.707106781186547, 0, -0.7071067811865481))) as fillet_2_piece_19:
        with BuildLine():
            CenterArc((FILLET_2_R, FILLET_2_R), FILLET_2_R, 180, 90)
            Line((0, FILLET_2_R), (0, 0))
            Line((0, 0), (FILLET_2_R, 0))
        make_face()
    extrude(amount=7.784271247, mode=Mode.SUBTRACT)
    with BuildSketch(Plane(origin=(-4.67602676, 10, -38.481152313), x_dir=(-0.7071067811865467, 0, 0.7071067811865485), z_dir=(0, 1, 0))) as fillet_2_piece_20:
        with BuildLine():
            CenterArc((FILLET_2_R, -FILLET_2_R), FILLET_2_R, 90, 90)
            Line((0, -FILLET_2_R), (0, 0))
            Line((0, 0), (FILLET_2_R, 0))
        make_face()
    extrude(amount=49, mode=Mode.SUBTRACT)
    with BuildSketch(Plane(origin=(-39.171715775, 60, -12.872764926), x_dir=(0.7071067811865477, 0, 0.7071067811865475), z_dir=(0.7071067811865475, 0, -0.7071067811865477))) as fillet_2_piece_21:
        with BuildLine():
            CenterArc((FILLET_2_R, FILLET_2_R), FILLET_2_R, 180, 90)
            Line((0, FILLET_2_R), (0, 0))
            Line((0, 0), (FILLET_2_R, 0))
        make_face()
    extrude(amount=45, mode=Mode.SUBTRACT)
    with BuildSketch(Plane(origin=(-33.667404789, 60, -10.903987846), x_dir=(0, -1, 0), z_dir=(-0.7071067811865471, 0, -0.707106781186548))) as fillet_2_piece_22:
        with BuildLine():
            CenterArc((FILLET_2_R, -FILLET_2_R), FILLET_2_R, 90, 90)
            Line((0, -FILLET_2_R), (0, 0))
            Line((0, 0), (FILLET_2_R, 0))
        make_face()
    extrude(amount=7.784271247, mode=Mode.SUBTRACT)
    with BuildSketch(Plane(origin=(-32.960298008, 10, -10.196881065), x_dir=(0.7071067811865502, 0, -0.7071067811865449), z_dir=(0, 1, 0))) as fillet_2_piece_23:
        with BuildLine():
            CenterArc((FILLET_2_R, FILLET_2_R), FILLET_2_R, 180, 90)
            Line((0, FILLET_2_R), (0, 0))
            Line((0, 0), (FILLET_2_R, 0))
        make_face()
    extrude(amount=49, mode=Mode.SUBTRACT)
    with BuildSketch(Plane(origin=(-27.433924368, 10, 2.10517242), x_dir=(0, 0, 1), z_dir=(-1, 0, 0))) as fillet_2_piece_24:
        with BuildLine():
            CenterArc((2 + FILLET_2_R, -FILLET_2_R), FILLET_2_R, 90, 90)
            Line((2, -FILLET_2_R), (2, 0))
            Line((2, 0), (2 + FILLET_2_R, 0))
        make_face()
    revolve(axis=Axis((-27.433924368, 10, 2.10517242), (0, 1, 0)), mode=Mode.SUBTRACT)

    # 草图2<3> → 切除-拉伸2 (cut, through all)
    with BuildSketch(Plane(origin=(-21.578589537, 0, -21.578589537), x_dir=(0.7071067811865472, 0, -0.7071067811865478), z_dir=(0.7071067811865478, 0, 0.7071067811865472))):
        with Locations((3.861441693, 55)):
            Circle(SKETCH_2_3_R)
        with Locations((3.861441693, 15)):
            Circle(SKETCH_2_3_R)
    extrude(amount=-CUT_EXTRUDE_2_DEPTH, mode=Mode.SUBTRACT)


solid = part.part
